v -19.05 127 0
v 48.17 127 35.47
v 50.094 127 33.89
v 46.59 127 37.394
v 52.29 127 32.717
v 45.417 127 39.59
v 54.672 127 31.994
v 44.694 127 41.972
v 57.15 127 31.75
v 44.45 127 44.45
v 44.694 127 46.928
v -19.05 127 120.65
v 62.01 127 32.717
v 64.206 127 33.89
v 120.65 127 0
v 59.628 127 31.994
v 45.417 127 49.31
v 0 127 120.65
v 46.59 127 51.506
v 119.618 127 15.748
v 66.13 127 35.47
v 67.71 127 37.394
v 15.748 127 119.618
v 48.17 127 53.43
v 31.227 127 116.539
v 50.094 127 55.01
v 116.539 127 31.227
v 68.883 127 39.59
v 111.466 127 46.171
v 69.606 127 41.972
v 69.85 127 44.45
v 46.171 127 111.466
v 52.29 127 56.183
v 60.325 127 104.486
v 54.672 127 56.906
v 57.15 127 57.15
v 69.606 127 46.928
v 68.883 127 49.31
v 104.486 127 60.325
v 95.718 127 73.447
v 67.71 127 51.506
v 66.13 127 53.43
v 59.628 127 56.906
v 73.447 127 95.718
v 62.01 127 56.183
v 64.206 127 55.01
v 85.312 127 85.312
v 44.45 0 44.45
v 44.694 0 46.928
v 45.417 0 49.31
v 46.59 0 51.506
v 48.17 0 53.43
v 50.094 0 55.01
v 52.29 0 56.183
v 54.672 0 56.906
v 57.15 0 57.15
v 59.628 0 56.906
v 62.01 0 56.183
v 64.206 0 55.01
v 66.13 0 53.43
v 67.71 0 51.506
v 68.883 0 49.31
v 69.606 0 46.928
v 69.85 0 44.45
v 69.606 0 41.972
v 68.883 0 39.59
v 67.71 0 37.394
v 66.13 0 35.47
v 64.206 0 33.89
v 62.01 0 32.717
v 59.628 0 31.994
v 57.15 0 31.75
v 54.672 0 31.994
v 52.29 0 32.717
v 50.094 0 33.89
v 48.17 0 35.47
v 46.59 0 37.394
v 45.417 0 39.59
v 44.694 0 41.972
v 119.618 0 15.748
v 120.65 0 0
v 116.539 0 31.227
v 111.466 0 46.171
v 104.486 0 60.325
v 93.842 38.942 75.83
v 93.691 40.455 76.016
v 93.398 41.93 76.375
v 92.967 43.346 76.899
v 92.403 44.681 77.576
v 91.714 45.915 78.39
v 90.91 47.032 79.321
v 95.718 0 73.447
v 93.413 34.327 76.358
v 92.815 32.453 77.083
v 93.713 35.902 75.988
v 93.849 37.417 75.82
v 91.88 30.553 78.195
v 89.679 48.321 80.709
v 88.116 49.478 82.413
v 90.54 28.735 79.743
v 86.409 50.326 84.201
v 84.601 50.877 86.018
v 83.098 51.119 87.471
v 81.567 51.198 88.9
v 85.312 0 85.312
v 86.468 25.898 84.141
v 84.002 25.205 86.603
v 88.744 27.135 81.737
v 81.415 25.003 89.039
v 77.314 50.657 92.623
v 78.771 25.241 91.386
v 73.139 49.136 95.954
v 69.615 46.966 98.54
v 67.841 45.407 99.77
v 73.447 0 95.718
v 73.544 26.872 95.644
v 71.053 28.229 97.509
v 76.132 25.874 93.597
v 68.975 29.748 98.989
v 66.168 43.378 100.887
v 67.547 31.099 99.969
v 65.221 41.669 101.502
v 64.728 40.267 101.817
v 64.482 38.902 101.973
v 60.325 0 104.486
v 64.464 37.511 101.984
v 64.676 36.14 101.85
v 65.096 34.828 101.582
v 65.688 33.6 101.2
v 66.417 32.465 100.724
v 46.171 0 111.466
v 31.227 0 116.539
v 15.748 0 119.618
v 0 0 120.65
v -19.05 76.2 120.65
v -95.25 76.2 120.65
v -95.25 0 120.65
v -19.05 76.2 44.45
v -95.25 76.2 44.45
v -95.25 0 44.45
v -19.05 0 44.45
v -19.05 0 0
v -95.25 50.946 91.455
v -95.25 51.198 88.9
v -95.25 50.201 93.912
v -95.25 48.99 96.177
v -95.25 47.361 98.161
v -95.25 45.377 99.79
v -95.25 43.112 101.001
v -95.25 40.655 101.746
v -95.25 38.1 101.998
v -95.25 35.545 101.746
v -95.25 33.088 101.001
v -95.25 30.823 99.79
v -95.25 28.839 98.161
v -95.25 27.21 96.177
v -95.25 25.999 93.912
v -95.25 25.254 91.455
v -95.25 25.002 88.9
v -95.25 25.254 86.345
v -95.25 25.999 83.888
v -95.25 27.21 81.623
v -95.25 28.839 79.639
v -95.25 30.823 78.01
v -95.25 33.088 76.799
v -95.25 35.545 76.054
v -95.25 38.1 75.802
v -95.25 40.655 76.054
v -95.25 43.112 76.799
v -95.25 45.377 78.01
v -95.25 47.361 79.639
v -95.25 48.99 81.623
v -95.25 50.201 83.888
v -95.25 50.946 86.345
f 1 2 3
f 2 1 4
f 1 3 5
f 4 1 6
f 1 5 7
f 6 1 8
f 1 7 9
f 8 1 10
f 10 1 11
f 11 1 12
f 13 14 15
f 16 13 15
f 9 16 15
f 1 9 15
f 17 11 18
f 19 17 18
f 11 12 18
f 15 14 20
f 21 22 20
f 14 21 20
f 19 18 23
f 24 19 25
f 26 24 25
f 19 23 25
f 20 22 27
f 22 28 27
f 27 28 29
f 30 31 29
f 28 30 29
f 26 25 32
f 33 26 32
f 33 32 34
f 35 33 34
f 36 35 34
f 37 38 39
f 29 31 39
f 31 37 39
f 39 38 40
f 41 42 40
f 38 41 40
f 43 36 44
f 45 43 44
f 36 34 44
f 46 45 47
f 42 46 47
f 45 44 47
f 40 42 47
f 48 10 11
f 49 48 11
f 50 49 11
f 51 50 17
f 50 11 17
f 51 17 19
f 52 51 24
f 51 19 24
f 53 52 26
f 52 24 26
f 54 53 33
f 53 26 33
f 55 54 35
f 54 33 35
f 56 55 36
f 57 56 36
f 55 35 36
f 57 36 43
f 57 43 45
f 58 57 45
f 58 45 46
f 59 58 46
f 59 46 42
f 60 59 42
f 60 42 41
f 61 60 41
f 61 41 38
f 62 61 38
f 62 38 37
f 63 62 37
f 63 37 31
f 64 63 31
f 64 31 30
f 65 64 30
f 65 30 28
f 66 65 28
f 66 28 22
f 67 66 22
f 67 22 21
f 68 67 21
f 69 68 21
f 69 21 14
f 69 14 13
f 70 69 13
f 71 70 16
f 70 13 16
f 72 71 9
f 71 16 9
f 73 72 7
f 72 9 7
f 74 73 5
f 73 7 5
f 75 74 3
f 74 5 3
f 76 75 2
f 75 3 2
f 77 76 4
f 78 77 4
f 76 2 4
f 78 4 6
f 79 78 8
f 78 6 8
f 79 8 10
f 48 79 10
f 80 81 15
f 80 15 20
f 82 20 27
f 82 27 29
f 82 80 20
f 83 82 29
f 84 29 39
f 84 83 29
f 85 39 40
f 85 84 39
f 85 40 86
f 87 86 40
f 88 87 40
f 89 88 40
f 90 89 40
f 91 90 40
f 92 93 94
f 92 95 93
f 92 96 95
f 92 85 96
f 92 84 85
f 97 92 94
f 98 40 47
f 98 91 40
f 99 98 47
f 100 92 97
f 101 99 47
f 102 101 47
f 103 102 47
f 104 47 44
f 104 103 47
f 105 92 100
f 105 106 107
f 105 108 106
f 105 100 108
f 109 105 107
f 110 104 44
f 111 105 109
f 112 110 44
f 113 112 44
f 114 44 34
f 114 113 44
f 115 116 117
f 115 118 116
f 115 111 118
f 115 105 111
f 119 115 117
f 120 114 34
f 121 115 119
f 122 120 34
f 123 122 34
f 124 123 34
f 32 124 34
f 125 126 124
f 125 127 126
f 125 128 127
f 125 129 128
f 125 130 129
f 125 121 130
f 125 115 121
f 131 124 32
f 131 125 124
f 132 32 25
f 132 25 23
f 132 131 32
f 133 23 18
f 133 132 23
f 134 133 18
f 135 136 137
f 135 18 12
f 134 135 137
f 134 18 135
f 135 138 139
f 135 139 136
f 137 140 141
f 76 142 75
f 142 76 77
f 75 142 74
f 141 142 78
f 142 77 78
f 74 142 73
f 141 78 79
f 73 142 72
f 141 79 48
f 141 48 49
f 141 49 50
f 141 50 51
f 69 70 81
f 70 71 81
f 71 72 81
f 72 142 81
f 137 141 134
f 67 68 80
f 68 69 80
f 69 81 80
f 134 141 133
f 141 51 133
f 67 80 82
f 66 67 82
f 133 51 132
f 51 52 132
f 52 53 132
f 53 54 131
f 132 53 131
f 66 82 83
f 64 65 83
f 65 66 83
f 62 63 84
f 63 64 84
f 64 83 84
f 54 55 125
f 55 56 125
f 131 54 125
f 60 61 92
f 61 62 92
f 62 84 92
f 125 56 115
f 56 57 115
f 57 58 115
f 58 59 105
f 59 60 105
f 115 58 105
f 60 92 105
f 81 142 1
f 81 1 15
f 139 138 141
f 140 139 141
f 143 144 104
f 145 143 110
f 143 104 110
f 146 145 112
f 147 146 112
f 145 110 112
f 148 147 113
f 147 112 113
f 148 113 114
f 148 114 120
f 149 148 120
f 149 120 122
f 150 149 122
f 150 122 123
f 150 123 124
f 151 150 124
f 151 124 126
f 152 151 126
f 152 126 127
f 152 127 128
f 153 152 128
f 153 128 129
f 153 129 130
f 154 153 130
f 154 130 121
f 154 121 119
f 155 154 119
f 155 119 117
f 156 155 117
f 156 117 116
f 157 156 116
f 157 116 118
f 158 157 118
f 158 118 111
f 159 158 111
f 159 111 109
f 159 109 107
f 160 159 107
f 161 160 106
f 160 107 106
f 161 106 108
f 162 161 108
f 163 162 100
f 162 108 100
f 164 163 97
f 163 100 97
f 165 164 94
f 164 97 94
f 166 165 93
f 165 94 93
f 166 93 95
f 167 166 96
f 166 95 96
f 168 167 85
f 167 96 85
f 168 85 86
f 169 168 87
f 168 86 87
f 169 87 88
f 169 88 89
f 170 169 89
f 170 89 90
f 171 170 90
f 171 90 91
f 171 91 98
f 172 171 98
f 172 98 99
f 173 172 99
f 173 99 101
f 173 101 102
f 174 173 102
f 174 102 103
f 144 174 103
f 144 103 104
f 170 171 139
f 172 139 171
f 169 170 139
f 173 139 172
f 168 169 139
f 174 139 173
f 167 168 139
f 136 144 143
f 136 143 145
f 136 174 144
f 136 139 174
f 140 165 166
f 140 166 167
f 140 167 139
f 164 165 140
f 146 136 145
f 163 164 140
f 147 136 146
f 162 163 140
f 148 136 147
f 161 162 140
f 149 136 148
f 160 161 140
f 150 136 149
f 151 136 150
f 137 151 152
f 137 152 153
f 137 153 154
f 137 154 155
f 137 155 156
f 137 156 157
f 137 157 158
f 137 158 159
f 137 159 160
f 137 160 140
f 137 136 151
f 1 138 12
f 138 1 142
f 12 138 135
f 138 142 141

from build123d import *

# Parameters (mm, degrees)
F0_W     = 19.05
F0_H     = 120.65
F1_DEPTH = 127
F2_W     = 76.2
F2_H     = 76.2
F3_DEPTH = 76.2
F5_D     = 26.19502
F7_D     = 25.4


with BuildPart() as f1:
    # F0 (on Front) → F1 (new body)
    with BuildSketch(Plane.XZ):
        with BuildLine():
            ThreePointArc((120.65, 0), (85.3124331502, 85.3124331502), (0, 120.65))
            Line((0, 120.65), (0, 0))
            Line((0, 0), (120.65, 0))
        make_face()
        with Locations((-9.525, 60.325)):
            Rectangle(F0_W, F0_H)
    extrude(amount=-F1_DEPTH)

    # F2 (on face) → F3 (join)
    with BuildSketch(Plane(origin=(-19.05, 0, 0), x_dir=(0, -1, 0), z_dir=(-1, 0, 0))):
        with Locations((-38.1, 82.55)):
            Rectangle(F2_W, F2_H)
    extrude(amount=F3_DEPTH)

    # F5 (through all)
    with Locations(Plane(origin=(-95.25, 0, 0), x_dir=(0, -1, 0), z_dir=(-1, 0, 0))):
        with Locations((-38.1, 88.9)):
            Hole(F5_D / 2)

    # F7 (through all)
    with Locations(Plane.XZ):
        with Locations((57.15, 44.45)):
            Hole(F7_D / 2)


solid = f1.part
